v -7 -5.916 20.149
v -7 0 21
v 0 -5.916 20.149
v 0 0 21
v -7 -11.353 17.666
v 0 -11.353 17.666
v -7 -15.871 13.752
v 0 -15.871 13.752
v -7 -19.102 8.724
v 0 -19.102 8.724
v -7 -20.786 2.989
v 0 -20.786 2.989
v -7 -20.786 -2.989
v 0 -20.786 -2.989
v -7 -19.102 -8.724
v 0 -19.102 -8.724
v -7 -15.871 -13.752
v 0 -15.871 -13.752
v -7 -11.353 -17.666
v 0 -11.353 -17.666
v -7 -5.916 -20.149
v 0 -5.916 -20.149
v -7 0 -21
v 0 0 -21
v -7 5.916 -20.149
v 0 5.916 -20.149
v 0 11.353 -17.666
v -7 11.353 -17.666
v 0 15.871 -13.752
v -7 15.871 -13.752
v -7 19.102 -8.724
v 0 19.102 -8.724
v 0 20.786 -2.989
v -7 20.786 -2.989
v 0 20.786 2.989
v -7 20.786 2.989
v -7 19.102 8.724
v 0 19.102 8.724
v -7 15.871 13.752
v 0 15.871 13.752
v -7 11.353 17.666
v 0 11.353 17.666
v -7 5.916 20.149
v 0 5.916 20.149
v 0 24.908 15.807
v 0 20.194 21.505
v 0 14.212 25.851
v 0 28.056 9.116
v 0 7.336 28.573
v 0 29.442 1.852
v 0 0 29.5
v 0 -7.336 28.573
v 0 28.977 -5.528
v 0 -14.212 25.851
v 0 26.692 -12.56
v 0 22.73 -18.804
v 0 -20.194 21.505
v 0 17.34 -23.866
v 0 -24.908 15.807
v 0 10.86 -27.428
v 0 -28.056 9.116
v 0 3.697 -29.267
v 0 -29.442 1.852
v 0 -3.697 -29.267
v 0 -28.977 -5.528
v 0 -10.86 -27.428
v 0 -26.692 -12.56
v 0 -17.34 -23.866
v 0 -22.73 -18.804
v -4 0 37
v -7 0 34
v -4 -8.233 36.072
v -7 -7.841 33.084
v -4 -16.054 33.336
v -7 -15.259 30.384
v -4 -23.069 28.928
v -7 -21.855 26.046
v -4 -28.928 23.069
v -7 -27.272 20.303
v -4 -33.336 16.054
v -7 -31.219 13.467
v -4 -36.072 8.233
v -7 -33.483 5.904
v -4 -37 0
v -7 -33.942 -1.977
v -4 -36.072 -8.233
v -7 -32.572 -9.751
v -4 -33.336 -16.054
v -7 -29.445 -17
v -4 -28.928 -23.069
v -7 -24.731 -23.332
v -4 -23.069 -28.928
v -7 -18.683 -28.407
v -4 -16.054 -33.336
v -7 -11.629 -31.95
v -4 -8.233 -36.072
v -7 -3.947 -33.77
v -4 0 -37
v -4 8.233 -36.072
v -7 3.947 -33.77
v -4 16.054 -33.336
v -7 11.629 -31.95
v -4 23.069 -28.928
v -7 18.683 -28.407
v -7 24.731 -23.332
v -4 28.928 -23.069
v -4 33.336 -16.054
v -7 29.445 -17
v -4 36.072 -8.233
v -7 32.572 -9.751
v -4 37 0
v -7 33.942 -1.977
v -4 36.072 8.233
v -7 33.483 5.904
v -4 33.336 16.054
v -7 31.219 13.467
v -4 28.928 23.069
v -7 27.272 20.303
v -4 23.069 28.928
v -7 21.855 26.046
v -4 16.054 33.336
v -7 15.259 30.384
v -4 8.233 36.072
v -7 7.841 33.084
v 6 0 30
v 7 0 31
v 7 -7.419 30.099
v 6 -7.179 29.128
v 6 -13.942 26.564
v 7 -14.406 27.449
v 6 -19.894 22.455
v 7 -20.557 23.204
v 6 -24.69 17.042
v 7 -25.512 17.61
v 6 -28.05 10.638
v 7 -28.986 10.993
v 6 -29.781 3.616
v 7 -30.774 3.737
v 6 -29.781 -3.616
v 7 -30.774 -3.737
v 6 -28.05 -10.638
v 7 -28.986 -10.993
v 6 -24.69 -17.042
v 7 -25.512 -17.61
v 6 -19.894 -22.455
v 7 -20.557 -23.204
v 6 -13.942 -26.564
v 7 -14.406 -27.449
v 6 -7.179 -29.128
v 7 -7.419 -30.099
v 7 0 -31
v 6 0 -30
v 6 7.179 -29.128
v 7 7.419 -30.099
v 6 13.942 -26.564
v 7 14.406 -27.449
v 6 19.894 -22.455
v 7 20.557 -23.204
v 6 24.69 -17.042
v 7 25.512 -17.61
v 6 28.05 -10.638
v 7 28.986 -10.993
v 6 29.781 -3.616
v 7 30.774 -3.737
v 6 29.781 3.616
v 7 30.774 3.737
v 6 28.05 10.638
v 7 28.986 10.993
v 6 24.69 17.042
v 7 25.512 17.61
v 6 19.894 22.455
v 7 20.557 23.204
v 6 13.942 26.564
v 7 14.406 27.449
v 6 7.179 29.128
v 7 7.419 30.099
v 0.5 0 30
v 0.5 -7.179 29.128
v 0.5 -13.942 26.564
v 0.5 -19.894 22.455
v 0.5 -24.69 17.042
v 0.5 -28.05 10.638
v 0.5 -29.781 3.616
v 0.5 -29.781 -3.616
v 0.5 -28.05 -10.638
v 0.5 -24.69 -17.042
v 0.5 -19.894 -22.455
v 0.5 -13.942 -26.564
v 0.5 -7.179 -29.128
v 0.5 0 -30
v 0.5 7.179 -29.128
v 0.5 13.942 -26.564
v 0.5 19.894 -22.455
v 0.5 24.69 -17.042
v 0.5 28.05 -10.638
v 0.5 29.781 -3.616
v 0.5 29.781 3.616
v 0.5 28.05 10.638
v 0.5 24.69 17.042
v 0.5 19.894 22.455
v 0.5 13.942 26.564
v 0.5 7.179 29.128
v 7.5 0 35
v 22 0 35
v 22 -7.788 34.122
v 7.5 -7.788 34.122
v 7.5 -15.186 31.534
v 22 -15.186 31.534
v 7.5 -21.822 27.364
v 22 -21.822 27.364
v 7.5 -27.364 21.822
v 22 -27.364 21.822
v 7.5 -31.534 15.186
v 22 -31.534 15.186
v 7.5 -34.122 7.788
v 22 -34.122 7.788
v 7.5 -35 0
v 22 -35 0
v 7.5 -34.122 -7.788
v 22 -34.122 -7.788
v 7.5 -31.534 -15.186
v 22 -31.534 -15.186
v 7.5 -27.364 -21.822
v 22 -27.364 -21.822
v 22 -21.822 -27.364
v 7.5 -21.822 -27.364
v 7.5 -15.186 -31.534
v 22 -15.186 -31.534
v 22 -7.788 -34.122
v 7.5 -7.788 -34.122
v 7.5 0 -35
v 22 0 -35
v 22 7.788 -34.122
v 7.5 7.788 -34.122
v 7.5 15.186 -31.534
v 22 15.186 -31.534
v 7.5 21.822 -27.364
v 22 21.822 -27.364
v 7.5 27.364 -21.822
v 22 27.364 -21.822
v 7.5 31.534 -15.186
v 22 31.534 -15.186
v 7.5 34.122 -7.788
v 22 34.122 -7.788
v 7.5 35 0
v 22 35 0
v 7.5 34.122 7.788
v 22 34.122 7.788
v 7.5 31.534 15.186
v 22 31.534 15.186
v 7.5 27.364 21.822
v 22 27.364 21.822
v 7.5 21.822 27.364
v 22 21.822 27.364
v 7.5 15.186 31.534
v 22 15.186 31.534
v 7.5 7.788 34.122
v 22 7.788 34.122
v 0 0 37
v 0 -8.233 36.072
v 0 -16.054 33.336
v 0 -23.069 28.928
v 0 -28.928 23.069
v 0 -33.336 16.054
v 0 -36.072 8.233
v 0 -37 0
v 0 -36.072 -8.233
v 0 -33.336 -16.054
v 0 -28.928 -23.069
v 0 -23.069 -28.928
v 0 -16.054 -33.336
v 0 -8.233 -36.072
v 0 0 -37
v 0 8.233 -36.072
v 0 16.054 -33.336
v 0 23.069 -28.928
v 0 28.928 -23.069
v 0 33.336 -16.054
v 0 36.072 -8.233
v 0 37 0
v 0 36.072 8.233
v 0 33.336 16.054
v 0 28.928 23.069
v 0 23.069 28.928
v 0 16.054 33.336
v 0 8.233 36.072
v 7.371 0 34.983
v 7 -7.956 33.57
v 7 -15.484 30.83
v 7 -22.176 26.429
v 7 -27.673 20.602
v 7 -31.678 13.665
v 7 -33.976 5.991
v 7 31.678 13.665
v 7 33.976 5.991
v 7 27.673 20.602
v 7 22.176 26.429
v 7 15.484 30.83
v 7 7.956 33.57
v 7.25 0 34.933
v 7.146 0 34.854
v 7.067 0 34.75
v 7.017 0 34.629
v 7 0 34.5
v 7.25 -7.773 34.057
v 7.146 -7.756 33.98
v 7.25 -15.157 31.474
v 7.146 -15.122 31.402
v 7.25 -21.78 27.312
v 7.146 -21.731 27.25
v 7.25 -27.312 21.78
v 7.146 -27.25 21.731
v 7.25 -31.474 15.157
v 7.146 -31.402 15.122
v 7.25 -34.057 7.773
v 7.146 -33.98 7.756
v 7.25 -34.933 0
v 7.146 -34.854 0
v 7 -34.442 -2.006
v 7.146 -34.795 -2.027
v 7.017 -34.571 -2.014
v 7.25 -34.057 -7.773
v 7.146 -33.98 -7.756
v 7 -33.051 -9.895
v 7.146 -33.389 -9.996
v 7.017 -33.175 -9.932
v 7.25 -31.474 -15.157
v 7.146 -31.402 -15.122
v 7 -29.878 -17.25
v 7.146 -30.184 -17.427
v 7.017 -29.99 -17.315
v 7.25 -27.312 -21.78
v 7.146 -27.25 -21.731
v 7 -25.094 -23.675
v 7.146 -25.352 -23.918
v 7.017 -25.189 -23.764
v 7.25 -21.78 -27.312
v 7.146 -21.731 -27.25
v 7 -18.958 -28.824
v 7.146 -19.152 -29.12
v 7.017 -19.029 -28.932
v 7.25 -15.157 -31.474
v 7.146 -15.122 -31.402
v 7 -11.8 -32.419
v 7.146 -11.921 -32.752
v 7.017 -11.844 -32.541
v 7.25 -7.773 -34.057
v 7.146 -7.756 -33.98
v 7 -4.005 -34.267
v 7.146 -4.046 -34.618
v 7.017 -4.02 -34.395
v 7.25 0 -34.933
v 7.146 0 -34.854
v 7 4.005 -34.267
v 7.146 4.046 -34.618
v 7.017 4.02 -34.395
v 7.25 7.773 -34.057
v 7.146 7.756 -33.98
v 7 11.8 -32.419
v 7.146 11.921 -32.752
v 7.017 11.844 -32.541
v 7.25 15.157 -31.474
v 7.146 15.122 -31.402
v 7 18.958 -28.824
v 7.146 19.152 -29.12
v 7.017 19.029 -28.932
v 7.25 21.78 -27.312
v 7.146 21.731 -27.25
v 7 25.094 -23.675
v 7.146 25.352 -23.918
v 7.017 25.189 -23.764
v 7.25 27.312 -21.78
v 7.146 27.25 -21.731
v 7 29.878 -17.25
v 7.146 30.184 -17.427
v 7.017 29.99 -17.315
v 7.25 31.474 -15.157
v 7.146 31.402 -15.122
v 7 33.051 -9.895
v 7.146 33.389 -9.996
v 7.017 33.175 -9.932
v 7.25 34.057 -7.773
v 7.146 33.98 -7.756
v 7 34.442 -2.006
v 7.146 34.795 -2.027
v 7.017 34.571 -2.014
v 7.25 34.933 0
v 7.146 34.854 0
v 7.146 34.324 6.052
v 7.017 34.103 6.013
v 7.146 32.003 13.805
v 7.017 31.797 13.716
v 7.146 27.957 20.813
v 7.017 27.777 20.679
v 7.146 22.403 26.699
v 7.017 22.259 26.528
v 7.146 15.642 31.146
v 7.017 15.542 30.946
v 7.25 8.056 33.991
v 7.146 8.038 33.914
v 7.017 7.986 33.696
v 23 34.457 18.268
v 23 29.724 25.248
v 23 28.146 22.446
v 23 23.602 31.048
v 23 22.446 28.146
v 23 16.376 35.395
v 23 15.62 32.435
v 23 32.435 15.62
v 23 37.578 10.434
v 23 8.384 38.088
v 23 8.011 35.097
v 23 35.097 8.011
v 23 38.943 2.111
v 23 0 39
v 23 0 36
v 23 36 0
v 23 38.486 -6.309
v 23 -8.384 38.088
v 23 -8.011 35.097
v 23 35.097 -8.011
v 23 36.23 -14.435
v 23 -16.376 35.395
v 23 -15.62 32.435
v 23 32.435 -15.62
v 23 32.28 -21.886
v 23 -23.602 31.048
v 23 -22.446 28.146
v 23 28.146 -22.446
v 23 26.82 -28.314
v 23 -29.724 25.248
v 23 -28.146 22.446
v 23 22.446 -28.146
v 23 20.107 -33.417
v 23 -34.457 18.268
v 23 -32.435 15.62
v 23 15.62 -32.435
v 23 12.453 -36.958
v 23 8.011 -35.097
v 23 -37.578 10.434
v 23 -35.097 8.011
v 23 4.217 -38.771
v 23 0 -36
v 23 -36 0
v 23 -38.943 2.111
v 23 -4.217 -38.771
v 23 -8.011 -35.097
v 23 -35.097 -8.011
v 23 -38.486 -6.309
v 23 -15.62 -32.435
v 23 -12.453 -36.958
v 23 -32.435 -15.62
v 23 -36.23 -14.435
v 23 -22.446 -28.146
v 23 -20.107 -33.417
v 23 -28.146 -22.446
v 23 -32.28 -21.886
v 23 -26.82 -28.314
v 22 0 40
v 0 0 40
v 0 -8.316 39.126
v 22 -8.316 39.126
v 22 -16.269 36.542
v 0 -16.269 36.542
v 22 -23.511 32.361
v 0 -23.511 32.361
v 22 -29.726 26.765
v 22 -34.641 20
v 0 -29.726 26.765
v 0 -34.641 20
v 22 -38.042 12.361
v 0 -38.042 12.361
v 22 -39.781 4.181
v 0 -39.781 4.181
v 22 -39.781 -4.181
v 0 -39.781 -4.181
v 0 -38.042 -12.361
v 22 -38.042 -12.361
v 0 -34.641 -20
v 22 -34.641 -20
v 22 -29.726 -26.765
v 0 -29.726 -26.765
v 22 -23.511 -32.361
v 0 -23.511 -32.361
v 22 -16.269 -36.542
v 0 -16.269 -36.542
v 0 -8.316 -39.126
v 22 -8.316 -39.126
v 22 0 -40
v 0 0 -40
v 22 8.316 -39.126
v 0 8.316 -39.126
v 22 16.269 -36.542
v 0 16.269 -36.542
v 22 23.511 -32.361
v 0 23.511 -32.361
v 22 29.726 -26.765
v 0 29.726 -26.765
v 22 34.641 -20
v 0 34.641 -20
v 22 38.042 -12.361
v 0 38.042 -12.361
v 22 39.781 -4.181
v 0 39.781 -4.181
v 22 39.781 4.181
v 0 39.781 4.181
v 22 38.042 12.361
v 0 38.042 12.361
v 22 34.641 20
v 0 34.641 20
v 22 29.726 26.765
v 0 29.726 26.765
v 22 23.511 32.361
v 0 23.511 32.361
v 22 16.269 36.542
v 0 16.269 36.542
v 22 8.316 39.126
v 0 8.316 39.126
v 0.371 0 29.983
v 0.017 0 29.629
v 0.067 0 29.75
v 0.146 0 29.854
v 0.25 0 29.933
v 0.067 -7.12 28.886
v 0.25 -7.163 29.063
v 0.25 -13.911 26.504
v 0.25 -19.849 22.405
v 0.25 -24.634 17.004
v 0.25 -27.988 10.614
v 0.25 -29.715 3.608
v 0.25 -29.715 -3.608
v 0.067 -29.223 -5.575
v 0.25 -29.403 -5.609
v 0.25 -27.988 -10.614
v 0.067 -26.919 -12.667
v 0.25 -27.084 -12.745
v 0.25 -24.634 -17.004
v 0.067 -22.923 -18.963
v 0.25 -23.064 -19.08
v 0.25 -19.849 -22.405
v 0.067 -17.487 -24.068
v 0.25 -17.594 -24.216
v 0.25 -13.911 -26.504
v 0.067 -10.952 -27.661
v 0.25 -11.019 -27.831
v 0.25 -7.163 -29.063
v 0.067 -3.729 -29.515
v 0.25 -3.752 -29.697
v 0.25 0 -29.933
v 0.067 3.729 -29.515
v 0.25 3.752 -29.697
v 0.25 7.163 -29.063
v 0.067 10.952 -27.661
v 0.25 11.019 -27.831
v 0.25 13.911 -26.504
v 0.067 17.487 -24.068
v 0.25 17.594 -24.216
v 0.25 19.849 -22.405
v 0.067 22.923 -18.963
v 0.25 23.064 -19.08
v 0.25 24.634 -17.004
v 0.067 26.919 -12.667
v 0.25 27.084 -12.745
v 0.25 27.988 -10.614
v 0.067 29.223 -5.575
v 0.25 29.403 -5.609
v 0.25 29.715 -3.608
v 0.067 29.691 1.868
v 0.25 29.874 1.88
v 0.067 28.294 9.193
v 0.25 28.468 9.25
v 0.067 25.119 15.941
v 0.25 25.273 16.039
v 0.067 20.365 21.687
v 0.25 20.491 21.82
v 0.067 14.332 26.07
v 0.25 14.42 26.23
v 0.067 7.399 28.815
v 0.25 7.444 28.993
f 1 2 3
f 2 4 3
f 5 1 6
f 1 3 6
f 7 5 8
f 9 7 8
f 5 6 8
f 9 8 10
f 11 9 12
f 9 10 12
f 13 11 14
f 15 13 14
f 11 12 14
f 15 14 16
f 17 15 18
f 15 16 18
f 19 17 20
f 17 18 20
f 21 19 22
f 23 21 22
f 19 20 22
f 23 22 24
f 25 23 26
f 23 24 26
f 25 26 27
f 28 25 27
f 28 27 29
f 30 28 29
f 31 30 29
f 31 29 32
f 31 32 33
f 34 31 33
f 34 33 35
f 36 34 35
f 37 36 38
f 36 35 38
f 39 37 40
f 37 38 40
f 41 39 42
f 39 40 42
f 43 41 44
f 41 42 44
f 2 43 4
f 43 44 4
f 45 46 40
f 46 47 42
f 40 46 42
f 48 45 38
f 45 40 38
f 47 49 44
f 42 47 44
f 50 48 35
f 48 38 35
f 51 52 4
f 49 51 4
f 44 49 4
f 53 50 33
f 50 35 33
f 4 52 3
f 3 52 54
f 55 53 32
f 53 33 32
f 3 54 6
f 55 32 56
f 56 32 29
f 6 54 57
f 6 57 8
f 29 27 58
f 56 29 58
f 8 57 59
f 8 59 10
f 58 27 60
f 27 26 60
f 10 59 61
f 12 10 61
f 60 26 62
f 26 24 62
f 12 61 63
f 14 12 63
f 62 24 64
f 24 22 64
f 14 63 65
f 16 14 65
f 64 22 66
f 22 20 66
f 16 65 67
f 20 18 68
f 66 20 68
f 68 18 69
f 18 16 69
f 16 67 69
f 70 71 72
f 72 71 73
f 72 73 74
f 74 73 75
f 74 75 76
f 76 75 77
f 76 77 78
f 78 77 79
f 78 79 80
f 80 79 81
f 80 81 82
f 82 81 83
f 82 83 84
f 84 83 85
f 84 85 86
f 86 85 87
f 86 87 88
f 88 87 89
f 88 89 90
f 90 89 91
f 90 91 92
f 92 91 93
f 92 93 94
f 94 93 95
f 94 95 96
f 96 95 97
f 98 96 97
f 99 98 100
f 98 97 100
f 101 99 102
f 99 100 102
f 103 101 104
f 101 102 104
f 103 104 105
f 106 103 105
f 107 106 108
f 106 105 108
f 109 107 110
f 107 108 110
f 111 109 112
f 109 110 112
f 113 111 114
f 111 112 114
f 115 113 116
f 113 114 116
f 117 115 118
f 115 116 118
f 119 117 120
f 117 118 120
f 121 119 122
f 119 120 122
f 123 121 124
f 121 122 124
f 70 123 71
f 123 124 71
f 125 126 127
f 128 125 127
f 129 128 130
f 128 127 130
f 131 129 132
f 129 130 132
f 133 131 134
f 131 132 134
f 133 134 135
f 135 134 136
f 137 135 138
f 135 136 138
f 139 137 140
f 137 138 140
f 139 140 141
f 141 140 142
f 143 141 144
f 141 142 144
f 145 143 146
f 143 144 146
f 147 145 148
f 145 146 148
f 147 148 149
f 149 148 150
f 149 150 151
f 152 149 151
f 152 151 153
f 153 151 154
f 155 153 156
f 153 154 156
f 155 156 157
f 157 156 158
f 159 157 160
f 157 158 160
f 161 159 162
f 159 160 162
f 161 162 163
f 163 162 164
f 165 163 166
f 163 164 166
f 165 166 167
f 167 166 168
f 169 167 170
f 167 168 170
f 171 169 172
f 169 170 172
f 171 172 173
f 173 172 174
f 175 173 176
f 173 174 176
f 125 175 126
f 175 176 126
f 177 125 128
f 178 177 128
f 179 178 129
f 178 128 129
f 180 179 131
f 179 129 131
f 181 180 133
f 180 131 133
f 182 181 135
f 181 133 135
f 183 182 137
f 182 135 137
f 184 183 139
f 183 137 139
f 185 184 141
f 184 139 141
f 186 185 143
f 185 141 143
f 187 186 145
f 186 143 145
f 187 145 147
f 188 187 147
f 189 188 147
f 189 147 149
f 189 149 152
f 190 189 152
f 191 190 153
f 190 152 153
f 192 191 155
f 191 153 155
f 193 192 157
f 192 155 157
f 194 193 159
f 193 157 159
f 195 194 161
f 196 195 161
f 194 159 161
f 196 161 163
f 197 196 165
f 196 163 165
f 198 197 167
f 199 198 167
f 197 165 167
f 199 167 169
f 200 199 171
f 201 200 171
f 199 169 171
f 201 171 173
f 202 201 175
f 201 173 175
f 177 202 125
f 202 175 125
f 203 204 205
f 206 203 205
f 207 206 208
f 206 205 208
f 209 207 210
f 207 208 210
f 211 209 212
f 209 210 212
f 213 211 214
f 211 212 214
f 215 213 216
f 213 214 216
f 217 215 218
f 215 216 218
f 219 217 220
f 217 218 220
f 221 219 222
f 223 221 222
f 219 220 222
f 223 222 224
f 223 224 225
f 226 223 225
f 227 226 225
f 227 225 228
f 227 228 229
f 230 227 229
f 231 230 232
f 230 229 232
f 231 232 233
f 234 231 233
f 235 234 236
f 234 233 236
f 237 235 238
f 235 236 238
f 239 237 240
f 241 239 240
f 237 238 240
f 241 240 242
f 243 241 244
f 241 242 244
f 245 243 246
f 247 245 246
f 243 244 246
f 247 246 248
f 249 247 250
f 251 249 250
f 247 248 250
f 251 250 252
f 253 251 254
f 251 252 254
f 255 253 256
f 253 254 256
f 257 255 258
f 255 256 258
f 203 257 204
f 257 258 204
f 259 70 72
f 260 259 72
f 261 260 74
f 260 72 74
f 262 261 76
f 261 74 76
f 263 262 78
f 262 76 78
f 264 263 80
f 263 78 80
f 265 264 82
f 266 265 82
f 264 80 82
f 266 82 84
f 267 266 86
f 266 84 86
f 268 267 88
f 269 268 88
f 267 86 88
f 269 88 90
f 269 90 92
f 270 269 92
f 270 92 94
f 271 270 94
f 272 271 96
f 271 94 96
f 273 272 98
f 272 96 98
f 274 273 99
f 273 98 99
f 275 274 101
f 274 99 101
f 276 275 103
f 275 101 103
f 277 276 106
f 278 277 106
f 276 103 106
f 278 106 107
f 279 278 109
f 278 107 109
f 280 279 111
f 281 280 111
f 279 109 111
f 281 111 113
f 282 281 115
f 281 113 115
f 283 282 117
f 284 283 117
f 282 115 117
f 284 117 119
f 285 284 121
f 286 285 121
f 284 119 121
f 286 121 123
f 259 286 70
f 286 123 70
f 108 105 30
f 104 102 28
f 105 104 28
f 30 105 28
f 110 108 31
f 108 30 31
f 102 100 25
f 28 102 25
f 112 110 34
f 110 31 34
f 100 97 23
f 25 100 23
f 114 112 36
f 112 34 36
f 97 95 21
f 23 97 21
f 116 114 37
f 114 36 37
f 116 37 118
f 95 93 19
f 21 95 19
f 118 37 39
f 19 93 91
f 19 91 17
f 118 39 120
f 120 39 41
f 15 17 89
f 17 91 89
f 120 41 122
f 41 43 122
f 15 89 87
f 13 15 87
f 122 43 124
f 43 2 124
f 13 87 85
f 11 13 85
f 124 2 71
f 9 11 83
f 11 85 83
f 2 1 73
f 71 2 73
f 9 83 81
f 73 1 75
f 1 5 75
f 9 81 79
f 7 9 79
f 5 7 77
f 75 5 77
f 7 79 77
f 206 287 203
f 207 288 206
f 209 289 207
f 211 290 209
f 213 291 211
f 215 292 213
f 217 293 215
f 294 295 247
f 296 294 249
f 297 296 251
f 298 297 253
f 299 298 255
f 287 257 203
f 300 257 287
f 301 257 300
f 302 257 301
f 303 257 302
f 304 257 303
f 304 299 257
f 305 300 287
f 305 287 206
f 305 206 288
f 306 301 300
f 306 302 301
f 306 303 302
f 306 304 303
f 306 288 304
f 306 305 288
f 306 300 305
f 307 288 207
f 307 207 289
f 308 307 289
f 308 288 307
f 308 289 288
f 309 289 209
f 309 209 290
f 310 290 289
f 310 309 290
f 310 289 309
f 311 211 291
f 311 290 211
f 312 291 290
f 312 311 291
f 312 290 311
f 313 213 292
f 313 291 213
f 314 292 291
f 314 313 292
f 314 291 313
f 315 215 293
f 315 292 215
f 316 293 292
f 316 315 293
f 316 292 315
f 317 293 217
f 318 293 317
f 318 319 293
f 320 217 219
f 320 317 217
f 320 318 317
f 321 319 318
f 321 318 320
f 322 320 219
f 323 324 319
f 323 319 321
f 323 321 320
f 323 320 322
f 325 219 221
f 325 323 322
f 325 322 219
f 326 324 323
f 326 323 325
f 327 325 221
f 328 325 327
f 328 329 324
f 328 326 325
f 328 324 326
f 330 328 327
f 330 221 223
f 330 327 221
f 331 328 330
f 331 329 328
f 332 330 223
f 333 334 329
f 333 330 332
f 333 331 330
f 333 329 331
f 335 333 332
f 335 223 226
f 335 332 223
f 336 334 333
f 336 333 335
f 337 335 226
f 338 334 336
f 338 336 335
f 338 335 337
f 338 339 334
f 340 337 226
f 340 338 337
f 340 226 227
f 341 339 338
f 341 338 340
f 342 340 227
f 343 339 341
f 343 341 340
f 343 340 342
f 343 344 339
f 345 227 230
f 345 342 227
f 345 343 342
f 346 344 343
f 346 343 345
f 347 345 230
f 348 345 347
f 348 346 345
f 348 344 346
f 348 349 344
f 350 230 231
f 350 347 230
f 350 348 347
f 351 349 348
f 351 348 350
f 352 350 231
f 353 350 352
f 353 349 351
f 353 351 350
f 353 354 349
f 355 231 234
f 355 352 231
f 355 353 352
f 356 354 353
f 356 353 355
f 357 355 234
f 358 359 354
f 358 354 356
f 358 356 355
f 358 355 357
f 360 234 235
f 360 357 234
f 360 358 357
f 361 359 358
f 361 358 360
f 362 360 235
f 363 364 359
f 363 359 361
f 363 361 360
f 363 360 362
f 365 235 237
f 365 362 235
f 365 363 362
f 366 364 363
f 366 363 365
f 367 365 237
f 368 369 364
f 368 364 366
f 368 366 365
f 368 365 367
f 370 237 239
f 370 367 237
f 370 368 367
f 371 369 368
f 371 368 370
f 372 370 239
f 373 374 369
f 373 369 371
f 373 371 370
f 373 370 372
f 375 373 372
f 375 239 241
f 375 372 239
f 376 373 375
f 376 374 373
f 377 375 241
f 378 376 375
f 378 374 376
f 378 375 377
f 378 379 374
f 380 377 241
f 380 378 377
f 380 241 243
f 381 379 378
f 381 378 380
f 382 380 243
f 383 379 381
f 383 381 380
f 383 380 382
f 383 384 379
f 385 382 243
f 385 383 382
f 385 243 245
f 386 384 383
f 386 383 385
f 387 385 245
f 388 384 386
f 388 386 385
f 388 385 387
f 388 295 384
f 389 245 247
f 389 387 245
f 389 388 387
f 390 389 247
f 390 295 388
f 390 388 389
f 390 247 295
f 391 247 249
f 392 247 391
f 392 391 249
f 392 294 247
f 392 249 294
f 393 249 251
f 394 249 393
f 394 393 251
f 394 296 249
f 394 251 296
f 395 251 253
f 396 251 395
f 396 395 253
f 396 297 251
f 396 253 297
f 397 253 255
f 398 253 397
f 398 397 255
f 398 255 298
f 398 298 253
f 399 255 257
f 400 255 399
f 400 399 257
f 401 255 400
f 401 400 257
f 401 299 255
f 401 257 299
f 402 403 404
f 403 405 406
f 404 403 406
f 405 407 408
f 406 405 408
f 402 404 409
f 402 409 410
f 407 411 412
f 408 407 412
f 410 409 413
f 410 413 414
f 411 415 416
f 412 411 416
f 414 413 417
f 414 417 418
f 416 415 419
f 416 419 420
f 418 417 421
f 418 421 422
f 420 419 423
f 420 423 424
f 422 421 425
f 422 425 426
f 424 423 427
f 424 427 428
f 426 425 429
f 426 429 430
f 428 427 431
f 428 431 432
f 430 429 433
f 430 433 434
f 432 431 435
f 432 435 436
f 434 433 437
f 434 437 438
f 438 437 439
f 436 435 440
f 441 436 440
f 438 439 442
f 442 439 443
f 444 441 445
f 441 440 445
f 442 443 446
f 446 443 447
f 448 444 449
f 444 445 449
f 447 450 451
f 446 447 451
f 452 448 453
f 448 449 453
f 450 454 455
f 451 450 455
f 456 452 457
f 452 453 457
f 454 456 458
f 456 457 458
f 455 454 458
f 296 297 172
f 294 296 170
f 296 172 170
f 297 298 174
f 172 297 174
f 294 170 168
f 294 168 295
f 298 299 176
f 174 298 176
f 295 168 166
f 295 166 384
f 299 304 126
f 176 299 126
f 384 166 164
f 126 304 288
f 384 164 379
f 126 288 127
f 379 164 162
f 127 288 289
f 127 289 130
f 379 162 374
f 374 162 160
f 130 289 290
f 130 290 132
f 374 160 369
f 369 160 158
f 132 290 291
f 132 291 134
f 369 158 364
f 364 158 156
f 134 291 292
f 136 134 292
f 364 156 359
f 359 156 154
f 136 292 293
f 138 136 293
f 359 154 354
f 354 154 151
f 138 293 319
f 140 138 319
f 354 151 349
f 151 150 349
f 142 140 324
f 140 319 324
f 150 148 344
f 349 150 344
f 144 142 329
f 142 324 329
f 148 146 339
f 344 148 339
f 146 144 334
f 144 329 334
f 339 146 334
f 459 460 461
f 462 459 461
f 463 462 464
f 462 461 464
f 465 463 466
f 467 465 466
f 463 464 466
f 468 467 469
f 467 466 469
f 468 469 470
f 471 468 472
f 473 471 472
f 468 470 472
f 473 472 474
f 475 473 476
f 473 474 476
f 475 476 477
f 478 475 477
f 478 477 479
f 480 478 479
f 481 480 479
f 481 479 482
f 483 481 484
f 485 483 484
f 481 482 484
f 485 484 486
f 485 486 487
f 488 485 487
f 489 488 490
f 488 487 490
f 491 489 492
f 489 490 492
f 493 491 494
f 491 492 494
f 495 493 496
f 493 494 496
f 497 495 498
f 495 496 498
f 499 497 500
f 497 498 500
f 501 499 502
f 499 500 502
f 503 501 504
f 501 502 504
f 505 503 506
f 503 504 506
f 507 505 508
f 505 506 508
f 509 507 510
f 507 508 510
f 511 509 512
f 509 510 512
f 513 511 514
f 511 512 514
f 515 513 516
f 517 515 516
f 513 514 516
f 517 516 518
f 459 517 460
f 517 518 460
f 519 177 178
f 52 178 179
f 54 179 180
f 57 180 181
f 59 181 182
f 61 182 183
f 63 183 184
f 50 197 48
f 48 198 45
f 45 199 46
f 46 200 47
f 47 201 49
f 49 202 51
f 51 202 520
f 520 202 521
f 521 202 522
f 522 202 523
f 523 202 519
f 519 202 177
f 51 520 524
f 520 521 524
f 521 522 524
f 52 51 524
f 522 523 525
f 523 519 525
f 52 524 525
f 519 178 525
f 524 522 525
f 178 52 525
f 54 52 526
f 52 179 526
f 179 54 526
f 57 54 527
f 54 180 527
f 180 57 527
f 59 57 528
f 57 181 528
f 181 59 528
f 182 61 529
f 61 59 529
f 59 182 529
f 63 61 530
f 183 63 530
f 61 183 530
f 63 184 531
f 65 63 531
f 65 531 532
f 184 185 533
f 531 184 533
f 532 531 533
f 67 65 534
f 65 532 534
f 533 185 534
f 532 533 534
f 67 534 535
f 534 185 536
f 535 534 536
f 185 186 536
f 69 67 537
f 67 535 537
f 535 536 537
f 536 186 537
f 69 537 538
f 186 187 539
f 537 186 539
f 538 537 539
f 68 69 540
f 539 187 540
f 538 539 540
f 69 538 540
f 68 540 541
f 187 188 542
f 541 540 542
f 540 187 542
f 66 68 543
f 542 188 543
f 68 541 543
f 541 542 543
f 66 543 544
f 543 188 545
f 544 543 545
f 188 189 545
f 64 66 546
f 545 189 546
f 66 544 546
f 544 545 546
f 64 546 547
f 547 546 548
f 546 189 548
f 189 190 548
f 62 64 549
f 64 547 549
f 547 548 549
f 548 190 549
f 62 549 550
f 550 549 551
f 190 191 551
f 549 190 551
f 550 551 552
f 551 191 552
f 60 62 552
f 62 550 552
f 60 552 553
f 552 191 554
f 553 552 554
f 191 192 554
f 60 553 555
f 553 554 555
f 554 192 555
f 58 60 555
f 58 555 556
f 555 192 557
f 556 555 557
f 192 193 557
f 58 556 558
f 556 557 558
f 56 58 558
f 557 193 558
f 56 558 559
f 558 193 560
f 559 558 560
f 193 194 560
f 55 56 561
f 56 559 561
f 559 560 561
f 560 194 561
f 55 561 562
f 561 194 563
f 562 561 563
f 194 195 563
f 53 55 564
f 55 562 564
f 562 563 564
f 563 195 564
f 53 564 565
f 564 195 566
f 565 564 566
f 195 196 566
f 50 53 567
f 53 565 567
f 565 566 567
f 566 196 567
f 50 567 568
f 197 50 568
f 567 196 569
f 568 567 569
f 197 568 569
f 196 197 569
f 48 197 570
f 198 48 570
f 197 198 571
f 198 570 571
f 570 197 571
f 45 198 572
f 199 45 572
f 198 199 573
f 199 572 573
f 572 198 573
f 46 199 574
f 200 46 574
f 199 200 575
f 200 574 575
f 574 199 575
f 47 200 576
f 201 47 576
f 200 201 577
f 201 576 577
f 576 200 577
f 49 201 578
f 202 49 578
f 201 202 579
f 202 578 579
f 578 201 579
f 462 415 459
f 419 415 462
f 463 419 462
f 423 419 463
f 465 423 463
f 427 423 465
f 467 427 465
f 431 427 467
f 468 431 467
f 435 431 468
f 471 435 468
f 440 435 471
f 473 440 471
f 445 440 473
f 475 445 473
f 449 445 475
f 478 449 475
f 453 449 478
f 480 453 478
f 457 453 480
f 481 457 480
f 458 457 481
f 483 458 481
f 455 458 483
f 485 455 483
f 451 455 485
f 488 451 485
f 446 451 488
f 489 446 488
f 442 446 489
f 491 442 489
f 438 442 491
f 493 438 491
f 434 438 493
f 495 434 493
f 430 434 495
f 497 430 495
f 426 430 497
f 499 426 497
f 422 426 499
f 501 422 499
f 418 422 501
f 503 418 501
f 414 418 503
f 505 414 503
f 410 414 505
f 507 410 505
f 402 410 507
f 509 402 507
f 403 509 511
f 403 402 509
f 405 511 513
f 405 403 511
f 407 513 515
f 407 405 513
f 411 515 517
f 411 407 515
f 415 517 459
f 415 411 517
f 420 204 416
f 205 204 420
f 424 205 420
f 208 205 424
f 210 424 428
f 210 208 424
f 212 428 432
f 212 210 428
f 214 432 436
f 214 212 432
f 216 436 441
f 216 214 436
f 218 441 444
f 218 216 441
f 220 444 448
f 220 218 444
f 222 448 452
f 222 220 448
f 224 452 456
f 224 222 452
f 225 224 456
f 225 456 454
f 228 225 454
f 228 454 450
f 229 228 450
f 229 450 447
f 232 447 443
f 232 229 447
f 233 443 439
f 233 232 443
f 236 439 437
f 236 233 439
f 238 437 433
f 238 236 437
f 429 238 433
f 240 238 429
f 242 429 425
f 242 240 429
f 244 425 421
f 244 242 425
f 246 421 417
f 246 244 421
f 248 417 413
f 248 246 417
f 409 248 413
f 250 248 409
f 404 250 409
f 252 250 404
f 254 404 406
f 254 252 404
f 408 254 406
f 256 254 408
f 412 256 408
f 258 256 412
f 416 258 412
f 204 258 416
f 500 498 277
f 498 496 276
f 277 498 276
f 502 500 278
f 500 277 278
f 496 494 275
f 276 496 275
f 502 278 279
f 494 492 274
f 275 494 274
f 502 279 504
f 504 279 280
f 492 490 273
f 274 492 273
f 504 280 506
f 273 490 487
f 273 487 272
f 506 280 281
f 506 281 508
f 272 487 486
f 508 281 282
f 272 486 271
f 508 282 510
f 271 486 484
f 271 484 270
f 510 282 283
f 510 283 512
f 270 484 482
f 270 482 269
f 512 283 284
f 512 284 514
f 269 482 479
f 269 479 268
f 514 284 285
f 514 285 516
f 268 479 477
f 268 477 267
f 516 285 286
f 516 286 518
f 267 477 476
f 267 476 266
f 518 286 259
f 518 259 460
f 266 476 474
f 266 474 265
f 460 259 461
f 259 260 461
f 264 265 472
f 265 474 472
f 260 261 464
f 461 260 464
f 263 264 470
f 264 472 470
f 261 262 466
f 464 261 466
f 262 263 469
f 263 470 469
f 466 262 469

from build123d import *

# Parameters (mm, degrees)
F2_SIZE = 3
F3_SIZE = 1
F4_R    = 0.5


with BuildPart() as f1:
    # F0 (on Front) → F1 (revolve)
    with BuildSketch(Plane.XZ):
        Polygon((-7, 21), (0, 21), (0, 30), (7, 30), (7, 35), (23, 35), (23, 40), (0, 40), (0, 37), (-7, 37), align=None)
    revolve(axis=Axis((-3.5, 0, 0), (1, 0, 0)))

    # F2
    f2_edges = [f1.edges().sort_by_distance(p)[0] for p in [
        (-7, 0, -37),
    ]]
    chamfer(f2_edges, length=F2_SIZE)

    # F3
    f3_edges = [f1.edges().sort_by_distance(p)[0] for p in [
        (23, 0, -40),
        (23, 0, -35),
        (7, 0, -30),
    ]]
    chamfer(f3_edges, length=F3_SIZE)

    # F4
    f4_edges = [f1.edges().sort_by_distance(p)[0] for p in [
        (0, 0, -30),
        (7, 0, -35),
    ]]
    fillet(f4_edges, radius=F4_R)


solid = f1.part
